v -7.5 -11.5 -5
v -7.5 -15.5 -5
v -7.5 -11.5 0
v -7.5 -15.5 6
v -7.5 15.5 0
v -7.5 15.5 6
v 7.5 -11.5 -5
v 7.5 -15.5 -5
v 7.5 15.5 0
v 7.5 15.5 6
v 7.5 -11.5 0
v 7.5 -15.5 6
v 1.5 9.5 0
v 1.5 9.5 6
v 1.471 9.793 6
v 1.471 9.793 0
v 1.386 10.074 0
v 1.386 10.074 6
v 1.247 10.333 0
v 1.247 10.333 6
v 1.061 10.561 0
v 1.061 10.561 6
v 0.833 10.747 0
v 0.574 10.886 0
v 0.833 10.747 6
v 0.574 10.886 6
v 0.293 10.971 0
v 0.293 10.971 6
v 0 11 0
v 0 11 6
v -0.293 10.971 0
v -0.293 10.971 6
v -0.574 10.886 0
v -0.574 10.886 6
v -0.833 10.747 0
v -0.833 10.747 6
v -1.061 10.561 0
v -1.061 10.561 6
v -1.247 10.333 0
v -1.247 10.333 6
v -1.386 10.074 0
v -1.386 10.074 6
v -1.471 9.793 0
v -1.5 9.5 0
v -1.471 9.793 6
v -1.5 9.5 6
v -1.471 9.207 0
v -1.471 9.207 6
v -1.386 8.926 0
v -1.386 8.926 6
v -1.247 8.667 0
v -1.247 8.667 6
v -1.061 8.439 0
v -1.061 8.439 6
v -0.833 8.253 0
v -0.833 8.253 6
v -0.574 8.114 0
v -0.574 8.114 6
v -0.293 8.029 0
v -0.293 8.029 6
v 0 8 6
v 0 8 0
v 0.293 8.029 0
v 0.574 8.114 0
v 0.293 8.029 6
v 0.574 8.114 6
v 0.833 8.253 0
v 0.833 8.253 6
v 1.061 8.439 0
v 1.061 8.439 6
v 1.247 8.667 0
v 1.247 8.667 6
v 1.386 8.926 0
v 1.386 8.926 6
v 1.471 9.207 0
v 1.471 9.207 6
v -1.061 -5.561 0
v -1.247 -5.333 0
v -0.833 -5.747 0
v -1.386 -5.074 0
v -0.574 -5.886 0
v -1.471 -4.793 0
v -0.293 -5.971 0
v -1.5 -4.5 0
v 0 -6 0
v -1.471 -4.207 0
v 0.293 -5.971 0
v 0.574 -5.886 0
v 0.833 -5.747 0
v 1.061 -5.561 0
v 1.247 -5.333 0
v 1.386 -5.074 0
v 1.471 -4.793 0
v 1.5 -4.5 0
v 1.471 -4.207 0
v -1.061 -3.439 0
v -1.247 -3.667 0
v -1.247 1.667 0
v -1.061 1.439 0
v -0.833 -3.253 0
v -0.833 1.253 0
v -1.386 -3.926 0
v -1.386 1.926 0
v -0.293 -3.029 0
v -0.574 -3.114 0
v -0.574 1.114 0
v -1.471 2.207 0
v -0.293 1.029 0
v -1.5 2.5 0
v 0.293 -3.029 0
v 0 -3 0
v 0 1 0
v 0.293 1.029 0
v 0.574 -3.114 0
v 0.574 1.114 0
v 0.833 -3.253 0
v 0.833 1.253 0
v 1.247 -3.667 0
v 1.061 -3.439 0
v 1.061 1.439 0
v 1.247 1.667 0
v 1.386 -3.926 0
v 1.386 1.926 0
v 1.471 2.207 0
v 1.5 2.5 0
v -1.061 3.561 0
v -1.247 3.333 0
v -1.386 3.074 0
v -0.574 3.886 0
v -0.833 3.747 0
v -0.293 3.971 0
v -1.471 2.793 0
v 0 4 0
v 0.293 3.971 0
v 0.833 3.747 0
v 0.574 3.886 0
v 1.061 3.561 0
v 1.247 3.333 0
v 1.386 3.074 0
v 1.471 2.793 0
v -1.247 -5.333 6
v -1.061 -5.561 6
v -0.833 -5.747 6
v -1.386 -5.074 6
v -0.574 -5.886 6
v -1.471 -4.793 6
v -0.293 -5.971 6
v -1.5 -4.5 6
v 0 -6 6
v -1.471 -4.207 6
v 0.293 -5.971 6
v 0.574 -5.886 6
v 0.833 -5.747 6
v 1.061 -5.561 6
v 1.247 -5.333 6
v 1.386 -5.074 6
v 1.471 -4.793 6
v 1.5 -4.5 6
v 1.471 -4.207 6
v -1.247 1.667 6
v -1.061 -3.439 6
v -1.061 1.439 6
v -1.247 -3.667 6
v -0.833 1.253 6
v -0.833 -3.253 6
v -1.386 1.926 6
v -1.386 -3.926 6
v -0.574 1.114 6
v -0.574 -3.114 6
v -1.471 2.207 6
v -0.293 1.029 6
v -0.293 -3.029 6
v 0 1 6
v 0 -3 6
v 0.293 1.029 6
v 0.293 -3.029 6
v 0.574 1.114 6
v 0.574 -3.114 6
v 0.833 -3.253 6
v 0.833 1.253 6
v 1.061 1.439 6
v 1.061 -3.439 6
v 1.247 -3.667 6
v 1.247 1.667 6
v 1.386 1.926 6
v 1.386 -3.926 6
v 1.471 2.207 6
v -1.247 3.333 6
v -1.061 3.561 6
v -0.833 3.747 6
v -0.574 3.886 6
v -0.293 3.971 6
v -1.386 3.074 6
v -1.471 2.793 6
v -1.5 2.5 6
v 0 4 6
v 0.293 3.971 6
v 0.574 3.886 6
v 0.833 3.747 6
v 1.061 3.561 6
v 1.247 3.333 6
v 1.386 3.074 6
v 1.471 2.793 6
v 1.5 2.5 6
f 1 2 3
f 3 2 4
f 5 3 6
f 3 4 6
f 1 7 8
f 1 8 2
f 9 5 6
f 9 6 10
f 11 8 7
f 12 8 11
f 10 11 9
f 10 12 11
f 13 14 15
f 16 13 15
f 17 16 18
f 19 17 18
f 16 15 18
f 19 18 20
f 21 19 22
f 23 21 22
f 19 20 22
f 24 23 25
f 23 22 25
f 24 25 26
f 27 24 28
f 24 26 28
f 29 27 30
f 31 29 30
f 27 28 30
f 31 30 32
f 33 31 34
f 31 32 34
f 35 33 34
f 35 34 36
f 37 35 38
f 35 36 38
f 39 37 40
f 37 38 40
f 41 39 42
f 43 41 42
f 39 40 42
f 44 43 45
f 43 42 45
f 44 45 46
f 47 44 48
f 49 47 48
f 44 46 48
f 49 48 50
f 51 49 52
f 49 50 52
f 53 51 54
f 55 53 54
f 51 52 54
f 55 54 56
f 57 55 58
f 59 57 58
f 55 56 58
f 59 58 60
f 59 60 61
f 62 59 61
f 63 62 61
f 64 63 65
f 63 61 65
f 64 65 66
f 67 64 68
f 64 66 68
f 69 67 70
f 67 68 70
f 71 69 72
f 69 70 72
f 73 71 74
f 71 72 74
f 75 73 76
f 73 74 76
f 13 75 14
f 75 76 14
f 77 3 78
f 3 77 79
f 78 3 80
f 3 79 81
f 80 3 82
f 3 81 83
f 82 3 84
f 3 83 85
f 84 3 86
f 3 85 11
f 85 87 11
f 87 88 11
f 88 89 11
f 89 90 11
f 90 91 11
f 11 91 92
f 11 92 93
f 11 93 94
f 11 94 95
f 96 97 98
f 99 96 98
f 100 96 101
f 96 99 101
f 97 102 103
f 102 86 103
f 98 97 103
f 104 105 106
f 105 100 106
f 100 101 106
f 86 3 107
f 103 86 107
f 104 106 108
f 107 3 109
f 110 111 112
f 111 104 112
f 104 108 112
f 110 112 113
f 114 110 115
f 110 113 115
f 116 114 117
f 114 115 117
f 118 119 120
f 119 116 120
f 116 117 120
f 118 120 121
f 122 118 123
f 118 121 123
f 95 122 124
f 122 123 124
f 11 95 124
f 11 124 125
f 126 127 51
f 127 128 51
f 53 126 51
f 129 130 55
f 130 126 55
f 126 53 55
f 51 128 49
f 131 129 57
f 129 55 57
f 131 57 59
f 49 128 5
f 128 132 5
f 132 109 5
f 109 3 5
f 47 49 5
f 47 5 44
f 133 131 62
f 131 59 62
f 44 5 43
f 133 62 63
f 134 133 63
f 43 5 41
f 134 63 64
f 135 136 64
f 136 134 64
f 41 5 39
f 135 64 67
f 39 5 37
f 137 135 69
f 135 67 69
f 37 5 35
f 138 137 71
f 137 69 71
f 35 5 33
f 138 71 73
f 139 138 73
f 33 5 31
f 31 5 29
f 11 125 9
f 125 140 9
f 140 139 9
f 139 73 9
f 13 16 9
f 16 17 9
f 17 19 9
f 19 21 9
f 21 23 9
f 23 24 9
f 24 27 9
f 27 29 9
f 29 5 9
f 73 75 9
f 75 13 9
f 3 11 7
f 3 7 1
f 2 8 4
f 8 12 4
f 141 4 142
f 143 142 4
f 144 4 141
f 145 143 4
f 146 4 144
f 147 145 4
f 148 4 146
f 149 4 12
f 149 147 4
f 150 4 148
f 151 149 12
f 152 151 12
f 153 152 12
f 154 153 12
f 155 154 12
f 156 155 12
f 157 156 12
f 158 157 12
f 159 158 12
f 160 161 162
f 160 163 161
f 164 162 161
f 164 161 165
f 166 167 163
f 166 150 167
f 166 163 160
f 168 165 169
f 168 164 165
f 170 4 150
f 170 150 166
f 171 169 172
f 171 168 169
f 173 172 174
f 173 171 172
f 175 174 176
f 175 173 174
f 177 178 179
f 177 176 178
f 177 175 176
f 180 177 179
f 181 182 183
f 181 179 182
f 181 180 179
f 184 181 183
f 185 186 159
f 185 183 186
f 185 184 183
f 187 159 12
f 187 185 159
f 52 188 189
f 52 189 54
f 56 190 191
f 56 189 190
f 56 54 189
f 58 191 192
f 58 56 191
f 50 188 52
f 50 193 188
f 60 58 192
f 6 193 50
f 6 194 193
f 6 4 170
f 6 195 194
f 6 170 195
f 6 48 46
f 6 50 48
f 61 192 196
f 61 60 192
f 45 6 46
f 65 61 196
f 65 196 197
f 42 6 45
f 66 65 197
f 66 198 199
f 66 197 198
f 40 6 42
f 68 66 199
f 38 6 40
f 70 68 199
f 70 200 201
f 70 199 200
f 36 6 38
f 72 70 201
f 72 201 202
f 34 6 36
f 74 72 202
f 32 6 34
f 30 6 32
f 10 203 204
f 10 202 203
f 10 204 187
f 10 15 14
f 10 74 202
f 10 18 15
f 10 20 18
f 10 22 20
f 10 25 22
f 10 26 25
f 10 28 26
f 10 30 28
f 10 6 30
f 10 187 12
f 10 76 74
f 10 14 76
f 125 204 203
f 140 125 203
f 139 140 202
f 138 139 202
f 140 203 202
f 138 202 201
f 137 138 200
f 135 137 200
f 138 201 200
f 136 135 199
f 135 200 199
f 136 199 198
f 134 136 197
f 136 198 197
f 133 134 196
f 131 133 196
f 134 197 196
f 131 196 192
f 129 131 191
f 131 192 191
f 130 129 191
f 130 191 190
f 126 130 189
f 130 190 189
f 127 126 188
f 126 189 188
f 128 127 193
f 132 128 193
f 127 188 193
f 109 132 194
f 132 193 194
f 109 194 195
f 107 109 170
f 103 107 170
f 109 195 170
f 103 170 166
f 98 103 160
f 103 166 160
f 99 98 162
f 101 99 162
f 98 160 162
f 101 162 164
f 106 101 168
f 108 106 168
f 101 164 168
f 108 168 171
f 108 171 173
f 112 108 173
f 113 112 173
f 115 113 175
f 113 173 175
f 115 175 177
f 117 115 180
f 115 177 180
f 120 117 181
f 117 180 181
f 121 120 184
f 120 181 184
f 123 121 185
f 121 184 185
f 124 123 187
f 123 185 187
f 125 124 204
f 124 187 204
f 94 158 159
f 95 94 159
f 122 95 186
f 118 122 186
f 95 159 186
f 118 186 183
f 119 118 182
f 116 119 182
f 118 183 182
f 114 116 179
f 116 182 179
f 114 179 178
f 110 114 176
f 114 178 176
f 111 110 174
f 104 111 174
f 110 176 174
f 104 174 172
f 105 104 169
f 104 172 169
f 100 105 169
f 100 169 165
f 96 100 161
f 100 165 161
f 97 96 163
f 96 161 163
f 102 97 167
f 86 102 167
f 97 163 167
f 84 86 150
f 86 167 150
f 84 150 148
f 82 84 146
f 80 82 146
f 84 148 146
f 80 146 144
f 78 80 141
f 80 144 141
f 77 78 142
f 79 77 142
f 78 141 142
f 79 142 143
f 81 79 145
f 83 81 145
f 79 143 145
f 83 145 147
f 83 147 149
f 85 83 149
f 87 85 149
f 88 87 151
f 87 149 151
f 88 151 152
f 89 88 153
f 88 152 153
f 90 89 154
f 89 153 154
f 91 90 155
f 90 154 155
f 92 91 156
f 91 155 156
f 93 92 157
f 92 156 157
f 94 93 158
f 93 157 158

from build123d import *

# Parameters (mm, degrees)
SKETCH1_W           = 15
SKETCH1_H           = 31
BOSS_EXTRUDE1_DEPTH = 6
SKETCH2_R           = 1.5
CUT_EXTRUDE1_DEPTH  = 6
SKETCH3_W           = 15
SKETCH3_H           = 4
BOSS_EXTRUDE2_DEPTH = 5


with BuildPart() as part:
    # Sketch1 → Boss-Extrude1 (new body)
    with BuildSketch(Plane.XY):
        Rectangle(SKETCH1_W, SKETCH1_H)
    extrude(amount=BOSS_EXTRUDE1_DEPTH)

    # Sketch2 → Cut-Extrude1 (cut)
    with BuildSketch(Plane.XY.offset(6)):
        with Locations((0, 9.5)):
            Circle(SKETCH2_R)
        with Locations((0, 2.5)):
            Circle(SKETCH2_R)
        with Locations((0, -4.5)):
            Circle(SKETCH2_R)
    extrude(amount=-CUT_EXTRUDE1_DEPTH, mode=Mode.SUBTRACT)

    # Sketch3 → Boss-Extrude2 (add)
    with BuildSketch(Plane(origin=(0, 0, 0), x_dir=(-1, 0, 0), z_dir=(0, 0, -1))):
        with Locations((0, -13.5)):
            Rectangle(SKETCH3_W, SKETCH3_H)
    extrude(amount=BOSS_EXTRUDE2_DEPTH)


solid = part.part
